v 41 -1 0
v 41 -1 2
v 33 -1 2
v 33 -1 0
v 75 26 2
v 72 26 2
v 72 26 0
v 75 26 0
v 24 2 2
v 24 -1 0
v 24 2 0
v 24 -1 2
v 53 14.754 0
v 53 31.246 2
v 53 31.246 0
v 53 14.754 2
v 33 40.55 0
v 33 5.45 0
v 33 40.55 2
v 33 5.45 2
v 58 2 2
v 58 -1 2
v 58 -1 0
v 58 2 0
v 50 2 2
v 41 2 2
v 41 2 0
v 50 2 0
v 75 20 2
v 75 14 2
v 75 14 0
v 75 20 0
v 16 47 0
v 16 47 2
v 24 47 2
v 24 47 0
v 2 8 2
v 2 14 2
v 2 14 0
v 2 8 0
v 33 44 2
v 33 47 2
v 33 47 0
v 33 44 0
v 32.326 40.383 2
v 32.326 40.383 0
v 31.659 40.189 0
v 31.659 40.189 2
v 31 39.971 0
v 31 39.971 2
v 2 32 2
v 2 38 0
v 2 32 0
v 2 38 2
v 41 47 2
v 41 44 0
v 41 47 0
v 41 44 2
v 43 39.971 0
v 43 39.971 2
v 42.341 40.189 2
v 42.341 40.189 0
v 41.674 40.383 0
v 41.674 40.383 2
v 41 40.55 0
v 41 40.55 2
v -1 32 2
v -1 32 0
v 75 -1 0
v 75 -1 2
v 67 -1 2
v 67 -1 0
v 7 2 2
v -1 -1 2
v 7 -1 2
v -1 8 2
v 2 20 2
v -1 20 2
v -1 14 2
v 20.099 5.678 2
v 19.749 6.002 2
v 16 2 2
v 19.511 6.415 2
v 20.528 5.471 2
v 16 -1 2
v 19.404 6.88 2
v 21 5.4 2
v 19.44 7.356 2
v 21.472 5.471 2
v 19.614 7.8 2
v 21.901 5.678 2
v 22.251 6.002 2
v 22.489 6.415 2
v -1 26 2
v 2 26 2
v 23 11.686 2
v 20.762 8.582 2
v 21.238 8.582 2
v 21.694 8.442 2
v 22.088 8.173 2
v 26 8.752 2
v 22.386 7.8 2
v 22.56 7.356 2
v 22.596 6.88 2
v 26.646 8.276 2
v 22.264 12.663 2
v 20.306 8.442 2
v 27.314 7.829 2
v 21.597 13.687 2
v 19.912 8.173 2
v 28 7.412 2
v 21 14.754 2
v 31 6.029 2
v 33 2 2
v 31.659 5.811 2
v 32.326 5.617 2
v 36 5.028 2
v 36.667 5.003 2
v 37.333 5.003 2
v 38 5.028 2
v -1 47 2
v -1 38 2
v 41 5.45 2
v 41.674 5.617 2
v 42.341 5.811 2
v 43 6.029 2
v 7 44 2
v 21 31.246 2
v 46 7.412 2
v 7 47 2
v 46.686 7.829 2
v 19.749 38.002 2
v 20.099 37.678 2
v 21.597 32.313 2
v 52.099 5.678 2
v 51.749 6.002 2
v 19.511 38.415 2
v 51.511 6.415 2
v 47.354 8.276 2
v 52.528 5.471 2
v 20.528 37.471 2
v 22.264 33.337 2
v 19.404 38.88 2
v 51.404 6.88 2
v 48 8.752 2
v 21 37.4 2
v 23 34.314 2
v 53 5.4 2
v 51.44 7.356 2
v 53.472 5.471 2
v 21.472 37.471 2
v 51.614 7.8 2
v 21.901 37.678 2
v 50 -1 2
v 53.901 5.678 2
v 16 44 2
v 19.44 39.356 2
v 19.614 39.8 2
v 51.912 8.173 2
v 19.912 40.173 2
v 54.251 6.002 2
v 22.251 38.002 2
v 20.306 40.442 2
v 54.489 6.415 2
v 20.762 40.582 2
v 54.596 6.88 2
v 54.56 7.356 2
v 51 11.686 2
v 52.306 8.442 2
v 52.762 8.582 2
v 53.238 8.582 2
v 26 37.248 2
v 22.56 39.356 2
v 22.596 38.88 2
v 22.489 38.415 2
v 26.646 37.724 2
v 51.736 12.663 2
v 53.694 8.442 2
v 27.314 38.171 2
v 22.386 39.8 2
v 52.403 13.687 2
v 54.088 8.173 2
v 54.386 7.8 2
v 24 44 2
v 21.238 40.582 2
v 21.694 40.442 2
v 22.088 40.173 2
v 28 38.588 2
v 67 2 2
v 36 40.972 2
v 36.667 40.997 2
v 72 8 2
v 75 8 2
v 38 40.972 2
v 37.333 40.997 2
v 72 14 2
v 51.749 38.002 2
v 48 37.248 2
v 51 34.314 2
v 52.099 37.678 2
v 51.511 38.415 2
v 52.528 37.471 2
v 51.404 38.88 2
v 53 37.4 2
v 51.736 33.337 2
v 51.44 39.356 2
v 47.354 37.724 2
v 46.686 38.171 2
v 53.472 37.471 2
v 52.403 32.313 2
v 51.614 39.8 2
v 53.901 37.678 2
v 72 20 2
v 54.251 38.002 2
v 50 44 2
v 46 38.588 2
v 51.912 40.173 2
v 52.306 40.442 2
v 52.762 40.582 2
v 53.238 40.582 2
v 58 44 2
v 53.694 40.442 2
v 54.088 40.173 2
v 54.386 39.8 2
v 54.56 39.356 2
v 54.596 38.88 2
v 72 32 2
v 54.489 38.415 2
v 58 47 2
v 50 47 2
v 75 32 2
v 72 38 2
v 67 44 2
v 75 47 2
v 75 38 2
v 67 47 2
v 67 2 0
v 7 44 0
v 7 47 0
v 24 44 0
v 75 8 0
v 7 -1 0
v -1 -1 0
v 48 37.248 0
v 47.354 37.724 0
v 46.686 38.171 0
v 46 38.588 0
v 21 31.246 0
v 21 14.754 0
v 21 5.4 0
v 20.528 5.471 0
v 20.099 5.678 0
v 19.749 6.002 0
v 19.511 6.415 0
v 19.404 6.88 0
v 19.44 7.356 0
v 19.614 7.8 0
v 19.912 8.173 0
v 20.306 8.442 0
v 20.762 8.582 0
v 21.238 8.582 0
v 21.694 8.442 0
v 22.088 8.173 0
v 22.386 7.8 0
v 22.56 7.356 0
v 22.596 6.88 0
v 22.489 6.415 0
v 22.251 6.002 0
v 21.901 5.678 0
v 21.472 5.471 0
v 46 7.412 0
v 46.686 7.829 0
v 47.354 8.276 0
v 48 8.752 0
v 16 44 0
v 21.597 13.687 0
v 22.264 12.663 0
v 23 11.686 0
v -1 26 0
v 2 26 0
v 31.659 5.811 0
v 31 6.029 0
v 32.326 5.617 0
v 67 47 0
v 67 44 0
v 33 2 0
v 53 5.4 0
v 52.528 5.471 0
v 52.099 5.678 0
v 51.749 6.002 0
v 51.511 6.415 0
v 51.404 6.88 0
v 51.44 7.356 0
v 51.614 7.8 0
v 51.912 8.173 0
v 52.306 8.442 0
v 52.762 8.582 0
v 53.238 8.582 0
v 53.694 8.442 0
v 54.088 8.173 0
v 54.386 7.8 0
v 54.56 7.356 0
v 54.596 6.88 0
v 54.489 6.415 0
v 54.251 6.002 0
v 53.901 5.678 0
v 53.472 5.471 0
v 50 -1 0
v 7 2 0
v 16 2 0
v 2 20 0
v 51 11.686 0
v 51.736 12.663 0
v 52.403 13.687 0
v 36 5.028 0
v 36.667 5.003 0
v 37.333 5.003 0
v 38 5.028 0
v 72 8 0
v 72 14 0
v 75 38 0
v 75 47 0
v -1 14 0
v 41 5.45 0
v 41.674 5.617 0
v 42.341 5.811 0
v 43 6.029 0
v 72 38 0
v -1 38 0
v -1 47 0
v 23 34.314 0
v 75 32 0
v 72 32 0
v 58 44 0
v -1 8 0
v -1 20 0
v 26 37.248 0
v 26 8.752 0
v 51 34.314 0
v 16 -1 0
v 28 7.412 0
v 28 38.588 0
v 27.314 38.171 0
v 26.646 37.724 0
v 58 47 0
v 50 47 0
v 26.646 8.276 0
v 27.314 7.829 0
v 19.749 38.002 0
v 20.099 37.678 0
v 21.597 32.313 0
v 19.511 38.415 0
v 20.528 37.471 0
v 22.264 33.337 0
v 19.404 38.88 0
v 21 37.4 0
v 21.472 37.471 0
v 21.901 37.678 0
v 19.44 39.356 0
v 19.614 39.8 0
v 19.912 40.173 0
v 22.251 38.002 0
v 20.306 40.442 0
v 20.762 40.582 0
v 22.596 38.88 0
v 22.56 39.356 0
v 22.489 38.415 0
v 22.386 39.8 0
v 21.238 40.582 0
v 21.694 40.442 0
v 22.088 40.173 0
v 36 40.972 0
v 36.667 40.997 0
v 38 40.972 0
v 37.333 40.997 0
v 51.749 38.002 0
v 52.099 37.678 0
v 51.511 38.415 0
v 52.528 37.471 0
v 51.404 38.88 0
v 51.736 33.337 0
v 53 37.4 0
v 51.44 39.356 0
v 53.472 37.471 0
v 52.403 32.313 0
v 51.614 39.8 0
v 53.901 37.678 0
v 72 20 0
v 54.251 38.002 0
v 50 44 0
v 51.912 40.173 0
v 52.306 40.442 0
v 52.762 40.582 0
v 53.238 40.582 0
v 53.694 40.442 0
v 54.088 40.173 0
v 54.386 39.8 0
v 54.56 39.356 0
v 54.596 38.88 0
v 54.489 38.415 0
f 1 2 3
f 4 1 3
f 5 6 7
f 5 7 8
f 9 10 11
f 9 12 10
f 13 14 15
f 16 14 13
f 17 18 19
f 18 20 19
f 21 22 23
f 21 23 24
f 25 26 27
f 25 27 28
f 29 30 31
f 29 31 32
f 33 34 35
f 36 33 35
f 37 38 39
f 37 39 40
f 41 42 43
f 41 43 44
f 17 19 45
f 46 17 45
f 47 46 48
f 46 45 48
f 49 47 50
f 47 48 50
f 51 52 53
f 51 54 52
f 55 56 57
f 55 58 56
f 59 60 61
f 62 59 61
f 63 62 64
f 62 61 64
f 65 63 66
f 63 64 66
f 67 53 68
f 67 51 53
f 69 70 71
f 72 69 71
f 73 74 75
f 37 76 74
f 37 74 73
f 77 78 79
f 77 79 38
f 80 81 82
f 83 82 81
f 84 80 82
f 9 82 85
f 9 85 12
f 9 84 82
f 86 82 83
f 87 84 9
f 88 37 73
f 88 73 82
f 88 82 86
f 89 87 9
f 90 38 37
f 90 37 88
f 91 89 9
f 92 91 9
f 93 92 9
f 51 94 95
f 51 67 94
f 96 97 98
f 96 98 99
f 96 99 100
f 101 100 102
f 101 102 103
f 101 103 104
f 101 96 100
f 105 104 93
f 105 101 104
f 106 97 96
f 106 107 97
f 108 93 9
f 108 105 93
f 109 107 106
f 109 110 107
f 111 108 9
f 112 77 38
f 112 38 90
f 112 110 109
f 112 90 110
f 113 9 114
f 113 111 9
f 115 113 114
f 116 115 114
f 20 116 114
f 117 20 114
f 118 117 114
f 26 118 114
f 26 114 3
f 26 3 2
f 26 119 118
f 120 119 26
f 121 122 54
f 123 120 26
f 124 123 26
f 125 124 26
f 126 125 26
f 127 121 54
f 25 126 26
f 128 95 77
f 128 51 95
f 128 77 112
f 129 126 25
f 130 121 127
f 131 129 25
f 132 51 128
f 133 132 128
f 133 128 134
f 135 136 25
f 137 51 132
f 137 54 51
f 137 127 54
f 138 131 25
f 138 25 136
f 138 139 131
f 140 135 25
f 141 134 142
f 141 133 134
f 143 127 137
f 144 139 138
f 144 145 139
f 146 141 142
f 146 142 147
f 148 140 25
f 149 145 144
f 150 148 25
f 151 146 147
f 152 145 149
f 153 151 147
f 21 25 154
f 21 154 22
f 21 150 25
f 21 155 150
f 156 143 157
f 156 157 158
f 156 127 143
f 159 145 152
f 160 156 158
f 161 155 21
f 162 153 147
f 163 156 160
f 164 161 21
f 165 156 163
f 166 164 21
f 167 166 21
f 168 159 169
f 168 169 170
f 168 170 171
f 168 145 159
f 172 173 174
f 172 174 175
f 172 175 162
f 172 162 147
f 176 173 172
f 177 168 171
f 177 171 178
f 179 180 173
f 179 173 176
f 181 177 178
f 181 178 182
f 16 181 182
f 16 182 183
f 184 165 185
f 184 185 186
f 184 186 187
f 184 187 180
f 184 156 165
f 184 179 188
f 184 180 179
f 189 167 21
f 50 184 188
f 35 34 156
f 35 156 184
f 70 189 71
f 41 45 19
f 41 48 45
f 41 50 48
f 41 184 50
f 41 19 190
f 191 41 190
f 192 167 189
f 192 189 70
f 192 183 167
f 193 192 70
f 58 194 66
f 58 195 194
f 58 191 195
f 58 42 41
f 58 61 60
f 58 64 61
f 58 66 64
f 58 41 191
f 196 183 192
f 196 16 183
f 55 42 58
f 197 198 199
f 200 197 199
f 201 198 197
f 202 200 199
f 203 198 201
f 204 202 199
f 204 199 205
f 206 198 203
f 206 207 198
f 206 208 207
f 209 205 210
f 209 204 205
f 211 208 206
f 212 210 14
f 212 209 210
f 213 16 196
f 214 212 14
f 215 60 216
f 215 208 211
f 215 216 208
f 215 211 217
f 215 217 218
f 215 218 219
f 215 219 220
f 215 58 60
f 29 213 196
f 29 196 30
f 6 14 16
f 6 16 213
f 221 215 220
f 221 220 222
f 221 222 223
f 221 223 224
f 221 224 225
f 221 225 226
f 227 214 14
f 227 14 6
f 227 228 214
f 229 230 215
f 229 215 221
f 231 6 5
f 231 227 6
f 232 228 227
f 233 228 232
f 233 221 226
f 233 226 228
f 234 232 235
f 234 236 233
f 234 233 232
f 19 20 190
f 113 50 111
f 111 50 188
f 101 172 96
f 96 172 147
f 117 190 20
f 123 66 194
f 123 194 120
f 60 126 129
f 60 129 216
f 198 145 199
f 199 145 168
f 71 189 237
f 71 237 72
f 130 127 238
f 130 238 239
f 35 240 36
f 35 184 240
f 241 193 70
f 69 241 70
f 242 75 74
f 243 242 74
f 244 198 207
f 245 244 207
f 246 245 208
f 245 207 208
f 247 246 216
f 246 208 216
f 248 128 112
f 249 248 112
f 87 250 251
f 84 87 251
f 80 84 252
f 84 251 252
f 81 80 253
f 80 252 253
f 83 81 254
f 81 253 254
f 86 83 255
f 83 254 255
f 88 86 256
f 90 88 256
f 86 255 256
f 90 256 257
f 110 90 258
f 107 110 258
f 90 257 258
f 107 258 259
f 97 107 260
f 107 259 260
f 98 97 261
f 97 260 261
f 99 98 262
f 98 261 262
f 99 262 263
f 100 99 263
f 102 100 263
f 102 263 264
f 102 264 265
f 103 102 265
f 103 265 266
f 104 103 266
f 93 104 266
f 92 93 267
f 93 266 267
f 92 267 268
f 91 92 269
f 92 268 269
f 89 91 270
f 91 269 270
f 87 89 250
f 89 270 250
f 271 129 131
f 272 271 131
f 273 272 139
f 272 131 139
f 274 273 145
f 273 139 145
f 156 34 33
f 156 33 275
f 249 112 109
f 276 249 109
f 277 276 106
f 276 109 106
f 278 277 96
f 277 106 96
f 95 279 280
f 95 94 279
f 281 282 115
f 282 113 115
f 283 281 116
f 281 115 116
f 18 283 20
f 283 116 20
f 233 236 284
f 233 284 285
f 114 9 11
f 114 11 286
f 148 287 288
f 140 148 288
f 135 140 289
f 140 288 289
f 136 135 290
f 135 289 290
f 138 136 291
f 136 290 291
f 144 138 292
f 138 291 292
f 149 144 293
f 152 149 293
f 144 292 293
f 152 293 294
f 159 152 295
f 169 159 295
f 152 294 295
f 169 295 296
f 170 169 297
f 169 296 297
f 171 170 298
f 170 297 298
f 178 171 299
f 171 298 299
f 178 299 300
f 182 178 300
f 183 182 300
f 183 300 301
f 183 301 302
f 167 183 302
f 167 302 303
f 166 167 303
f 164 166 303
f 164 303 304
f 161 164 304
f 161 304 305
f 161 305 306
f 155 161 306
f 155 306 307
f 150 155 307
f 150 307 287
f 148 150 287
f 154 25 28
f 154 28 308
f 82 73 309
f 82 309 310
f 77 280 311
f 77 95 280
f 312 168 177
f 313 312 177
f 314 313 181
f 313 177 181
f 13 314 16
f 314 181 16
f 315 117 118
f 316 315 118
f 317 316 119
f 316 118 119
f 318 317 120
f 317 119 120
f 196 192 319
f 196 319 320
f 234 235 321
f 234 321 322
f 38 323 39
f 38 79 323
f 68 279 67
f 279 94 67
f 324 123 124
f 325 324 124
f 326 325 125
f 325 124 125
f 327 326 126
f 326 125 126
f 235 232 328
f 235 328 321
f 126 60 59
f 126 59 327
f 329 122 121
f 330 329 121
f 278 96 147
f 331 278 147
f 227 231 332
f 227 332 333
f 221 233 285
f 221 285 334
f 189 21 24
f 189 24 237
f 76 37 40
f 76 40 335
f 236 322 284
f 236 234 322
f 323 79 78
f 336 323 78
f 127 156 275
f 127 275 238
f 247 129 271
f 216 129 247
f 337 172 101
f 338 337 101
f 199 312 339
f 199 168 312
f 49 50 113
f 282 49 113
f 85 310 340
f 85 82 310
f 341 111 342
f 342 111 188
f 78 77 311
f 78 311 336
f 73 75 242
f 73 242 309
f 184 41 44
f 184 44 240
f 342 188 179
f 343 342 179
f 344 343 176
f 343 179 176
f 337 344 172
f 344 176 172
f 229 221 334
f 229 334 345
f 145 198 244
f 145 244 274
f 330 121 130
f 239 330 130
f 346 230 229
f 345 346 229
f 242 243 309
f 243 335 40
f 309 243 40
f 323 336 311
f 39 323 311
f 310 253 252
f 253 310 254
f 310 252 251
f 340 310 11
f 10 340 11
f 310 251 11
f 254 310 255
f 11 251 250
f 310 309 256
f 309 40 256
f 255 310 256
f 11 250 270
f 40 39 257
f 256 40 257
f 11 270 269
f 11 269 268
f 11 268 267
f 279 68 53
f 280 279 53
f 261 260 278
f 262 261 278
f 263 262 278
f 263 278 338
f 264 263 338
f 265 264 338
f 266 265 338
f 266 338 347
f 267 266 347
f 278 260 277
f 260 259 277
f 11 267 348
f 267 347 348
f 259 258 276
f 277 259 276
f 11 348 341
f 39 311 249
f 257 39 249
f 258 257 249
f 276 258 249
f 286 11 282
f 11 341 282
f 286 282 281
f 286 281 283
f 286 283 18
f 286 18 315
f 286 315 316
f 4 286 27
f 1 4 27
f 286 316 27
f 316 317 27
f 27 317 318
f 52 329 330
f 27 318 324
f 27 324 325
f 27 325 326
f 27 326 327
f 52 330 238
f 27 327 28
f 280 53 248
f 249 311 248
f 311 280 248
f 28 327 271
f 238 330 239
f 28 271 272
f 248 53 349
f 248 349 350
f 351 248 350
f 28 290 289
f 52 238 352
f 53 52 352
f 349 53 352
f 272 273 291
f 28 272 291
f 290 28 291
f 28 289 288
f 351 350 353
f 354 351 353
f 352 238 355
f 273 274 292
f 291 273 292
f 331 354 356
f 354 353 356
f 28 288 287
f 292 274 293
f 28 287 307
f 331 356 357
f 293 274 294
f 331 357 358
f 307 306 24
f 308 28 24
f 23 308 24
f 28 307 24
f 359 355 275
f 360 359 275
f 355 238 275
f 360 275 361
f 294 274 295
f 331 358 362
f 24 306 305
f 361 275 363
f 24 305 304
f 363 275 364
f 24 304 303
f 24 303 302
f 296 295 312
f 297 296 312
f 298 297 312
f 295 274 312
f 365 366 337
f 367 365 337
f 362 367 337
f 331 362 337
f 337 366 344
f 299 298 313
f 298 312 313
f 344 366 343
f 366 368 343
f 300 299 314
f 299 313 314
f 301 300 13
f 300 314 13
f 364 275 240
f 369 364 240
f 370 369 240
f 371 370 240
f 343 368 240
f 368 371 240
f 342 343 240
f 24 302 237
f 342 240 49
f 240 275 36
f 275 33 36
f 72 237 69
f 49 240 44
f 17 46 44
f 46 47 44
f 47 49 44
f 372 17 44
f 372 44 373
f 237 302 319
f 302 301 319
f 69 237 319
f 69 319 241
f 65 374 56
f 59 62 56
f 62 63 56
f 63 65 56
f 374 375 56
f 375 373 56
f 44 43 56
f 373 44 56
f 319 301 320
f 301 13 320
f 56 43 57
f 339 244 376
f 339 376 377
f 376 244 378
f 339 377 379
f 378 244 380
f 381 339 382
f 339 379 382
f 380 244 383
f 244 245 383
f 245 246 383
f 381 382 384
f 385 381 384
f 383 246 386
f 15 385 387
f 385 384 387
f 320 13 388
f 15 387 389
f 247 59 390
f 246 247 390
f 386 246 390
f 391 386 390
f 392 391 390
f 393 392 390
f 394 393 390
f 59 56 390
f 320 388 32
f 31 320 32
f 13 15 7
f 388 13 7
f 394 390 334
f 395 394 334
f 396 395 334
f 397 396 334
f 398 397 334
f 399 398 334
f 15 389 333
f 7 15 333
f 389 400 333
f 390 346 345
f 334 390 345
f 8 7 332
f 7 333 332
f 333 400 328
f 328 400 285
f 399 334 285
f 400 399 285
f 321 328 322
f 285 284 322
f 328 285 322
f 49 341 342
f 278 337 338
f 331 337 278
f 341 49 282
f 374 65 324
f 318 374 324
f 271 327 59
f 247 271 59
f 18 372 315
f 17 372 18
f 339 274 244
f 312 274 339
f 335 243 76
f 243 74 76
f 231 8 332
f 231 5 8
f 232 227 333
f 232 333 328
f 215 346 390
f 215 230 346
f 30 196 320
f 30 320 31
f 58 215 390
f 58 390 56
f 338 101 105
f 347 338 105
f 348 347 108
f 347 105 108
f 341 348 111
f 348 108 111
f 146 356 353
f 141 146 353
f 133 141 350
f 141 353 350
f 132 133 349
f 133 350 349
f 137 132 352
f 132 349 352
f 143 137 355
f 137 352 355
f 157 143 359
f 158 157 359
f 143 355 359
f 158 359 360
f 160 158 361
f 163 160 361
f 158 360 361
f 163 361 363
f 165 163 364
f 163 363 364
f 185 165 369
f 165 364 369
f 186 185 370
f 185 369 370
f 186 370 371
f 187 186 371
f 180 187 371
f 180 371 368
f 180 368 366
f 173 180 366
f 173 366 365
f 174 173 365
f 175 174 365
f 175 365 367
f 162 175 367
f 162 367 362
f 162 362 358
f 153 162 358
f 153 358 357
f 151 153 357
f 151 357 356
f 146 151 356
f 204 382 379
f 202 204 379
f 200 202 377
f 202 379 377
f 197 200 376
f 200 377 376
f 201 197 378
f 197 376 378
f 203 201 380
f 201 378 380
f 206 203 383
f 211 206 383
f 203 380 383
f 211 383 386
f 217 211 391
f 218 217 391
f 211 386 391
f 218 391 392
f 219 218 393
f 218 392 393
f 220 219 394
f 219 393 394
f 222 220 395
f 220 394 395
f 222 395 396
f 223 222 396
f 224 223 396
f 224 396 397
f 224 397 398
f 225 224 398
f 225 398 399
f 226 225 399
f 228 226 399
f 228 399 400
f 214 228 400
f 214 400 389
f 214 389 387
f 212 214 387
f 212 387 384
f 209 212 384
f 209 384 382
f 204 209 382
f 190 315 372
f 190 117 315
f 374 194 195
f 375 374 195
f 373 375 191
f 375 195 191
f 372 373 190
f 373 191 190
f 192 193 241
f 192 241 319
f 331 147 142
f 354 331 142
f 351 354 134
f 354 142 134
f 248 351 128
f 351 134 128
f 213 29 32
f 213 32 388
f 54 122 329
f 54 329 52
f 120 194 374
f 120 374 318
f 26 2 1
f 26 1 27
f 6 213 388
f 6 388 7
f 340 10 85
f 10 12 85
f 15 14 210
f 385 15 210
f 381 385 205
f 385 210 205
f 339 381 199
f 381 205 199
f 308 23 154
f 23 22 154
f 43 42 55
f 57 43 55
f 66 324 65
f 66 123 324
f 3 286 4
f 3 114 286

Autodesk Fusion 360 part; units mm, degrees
sketch "スケッチ1" plane through (0, 0, 0) normal (0, 0, 1) x (1, 0, 0)
  line L0 (0, 0) -> (74, 0)
  line L1 (74, 0) -> (74, 46)
  line L2 (74, 46) -> (0, 46)
  line L3 (0, 46) -> (0, 0)
  dimension "d1" = 46
  dimension "d2" = 74
extrude "押し出し1" add sketch "スケッチ1" along normal blind 2
sketch "スケッチ2" plane through (0, 0, 2) normal (0, 0, 1) x (-1, 0, 0)
  line L0 (0, -46) -> (0, 0)
  line L1 (0, 0) -> (-74, 0)
  line L2 (-74, 0) -> (-74, -46)
  line L3 (-74, -46) -> (0, -46)
  circle A0 centre (-53, -39) radius 1.6
  circle A1 centre (-53, -39) radius 1.6
  circle A2 centre (-53, -7) radius 1.6
  circle A3 centre (-21, -7) radius 1.6
  circle A4 centre (-21, -39) radius 1.6
  dimension "d5" = 3.2
  dimension "d6" = 7
  dimension "d7" = 21
  dimension "d8" = 3.2
  dimension "d9" = 3.2
  dimension "d10" = 3.2
  dimension "d11" = 3.2
  dimension "d12" = 7
  dimension "d13" = 21
hole "穴1" at (21, 39, 2) at (53, 39, 2) at (53, 7, 2) at (21, 7, 2) direction (0, 0, -1) diameter 3.2 depth 16 tip angle 118
sketch "スケッチ3" plane through (0, 0, 2) normal (0, 0, 1) x (-1, 0, 0)
  circle A0 centre (-53, -7) radius 1.6
  circle A1 centre (-21, -39) radius 1.6
  circle A2 centre (-53, -39) radius 1.6
  circle A3 centre (-21, -7) radius 1.6
  line L0 (0, -46) -> (0, 0)
  line L1 (0, 0) -> (-74, 0)
  line L2 (-74, 0) -> (-74, -46)
  line L3 (-74, -46) -> (0, -46)
  line L4 (-58, -46) -> (-67, -46)
  line L5 (-67, -46) -> (-67, -44)
  line L6 (-67, -44) -> (-58, -44)
  line L7 (-58, -44) -> (-58, -46)
  line L8 (-50, -46) -> (-50, -44)
  line L9 (-41, -46) -> (-50, -46)
  line L10 (-50, -44) -> (-41, -44)
  line L11 (-41, -44) -> (-41, -46)
  line L12 (-33, -46) -> (-33, -44)
  line L13 (-24, -46) -> (-33, -46)
  line L14 (-33, -44) -> (-24, -44)
  line L15 (-24, -44) -> (-24, -46)
  line L16 (-16, -46) -> (-16, -44)
  line L17 (-7, -46) -> (-16, -46)
  line L18 (-16, -44) -> (-7, -44)
  line L19 (-7, -44) -> (-7, -46)
  line L20 (0, -38) -> (-2, -38)
  line L21 (-2, -38) -> (-2, -32)
  line L22 (-2, -32) -> (0, -32)
  line L23 (0, -32) -> (0, -38)
  line L24 (-2, -20) -> (0, -20)
  line L25 (0, -20) -> (0, -26)
  line L26 (-2, -26) -> (-2, -20)
  line L27 (0, -26) -> (-2, -26)
  line L28 (-2, -8) -> (0, -8)
  line L29 (0, -8) -> (0, -14)
  line L30 (-2, -14) -> (-2, -8)
  line L31 (0, -14) -> (-2, -14)
  line L32 (-72, -8) -> (-72, -14)
  line L33 (-72, -38) -> (-74, -38)
  line L34 (-72, -32) -> (-72, -38)
  line L35 (-74, -26) -> (-74, -20)
  line L36 (-74, -32) -> (-72, -32)
  line L37 (-74, -20) -> (-72, -20)
  line L38 (-72, -20) -> (-72, -26)
  line L39 (-74, -14) -> (-74, -8)
  line L40 (-72, -26) -> (-74, -26)
  line L41 (-74, -38) -> (-74, -32)
  line L42 (-74, -8) -> (-72, -8)
  line L43 (-72, -14) -> (-74, -14)
  line L44 (-144, -8) -> (-144, -14)
  line L45 (-144, -38) -> (-146, -38)
  line L46 (-144, -32) -> (-144, -38)
  line L47 (-146, -26) -> (-146, -20)
  line L48 (-146, -32) -> (-144, -32)
  line L49 (-146, -20) -> (-144, -20)
  line L50 (-144, -20) -> (-144, -26)
  line L51 (-146, -14) -> (-146, -8)
  line L52 (-144, -26) -> (-146, -26)
  line L53 (-146, -38) -> (-146, -32)
  line L54 (-146, -8) -> (-144, -8)
  line L55 (-144, -14) -> (-146, -14)
  line L56 (-41, 0) -> (-41, -2)
  line L57 (-67, 0) -> (-58, 0)
  line L58 (-67, -2) -> (-67, 0)
  line L59 (-41, -2) -> (-50, -2)
  line L60 (-7, 0) -> (-7, -2)
  line L61 (-24, 0) -> (-24, -2)
  line L62 (-33, 0) -> (-24, 0)
  line L63 (-50, -2) -> (-50, 0)
  line L64 (-24, -2) -> (-33, -2)
  line L65 (-7, -2) -> (-16, -2)
  line L66 (-58, -2) -> (-67, -2)
  line L67 (-16, -2) -> (-16, 0)
  line L68 (-50, 0) -> (-41, 0)
  line L69 (-58, 0) -> (-58, -2)
  line L70 (-16, 0) -> (-7, 0)
  line L71 (-33, -2) -> (-33, 0)
  line L72 (-41, 44) -> (-41, 42)
  line L73 (-67, 44) -> (-58, 44)
  line L74 (-67, 42) -> (-67, 44)
  line L75 (-41, 42) -> (-50, 42)
  line L76 (-7, 44) -> (-7, 42)
  line L77 (-24, 44) -> (-24, 42)
  line L78 (-33, 44) -> (-24, 44)
  line L79 (-50, 42) -> (-50, 44)
  line L80 (-24, 42) -> (-33, 42)
  line L81 (-7, 42) -> (-16, 42)
  line L82 (-58, 42) -> (-67, 42)
  line L83 (-16, 42) -> (-16, 44)
  line L84 (-50, 44) -> (-41, 44)
  line L85 (-58, 44) -> (-58, 42)
  line L86 (-16, 44) -> (-7, 44)
  line L87 (-33, 42) -> (-33, 44)
  dimension "d17" = 9
  dimension "d18" = 2
  dimension "d19" = 7
  dimension "d22" = 17
  dimension "d23" = 0
  dimension "d24" = 6
  dimension "d25" = 2
  dimension "d26" = 8
  dimension "d29" = 0
  dimension "d30" = 12
  dimension "d33" = -72
  dimension "d34" = 0
  dimension "d37" = 0
  dimension "d38" = 44
extrude "押し出し2" cut sketch "スケッチ3" against normal blind 2 contours L0 L20 L21 L22 L23 | L3 L16 L17 L18 L19 | L0 L24 L25 L26 L27 | L3 L12 L13 L14 L15 | L0 L28 L29 L30 L31 | L3 L8 L9 L10 L11 | L3 L4 L5 L6 L7 | L1 L60 L65 L67 L70 | L1 L61 L62 L64 L71 | L2 L33 L34 L36 L41 | L1 L56 L59 L63 L68 | L2 L35 L37 L38 L40 | L1 L57 L58 L66 L69 | L2 L32 L39 L42 L43
sketch "スケッチ4" plane through (0, 0, 2) normal (0, 0, 1) x (-1, 0, 0)
  line L0 (-50, -2) -> (-50, 0)
  line L1 (-50, 0) -> (-58, 0)
  line L2 (-58, 0) -> (-58, -2)
  line L3 (-58, -2) -> (-67, -2)
  line L4 (-67, -2) -> (-67, 0)
  line L5 (-67, 0) -> (-74, 0)
  line L6 (-74, 0) -> (-74, -8)
  line L7 (-74, -8) -> (-72, -8)
  line L8 (-72, -8) -> (-72, -14)
  line L9 (-72, -14) -> (-74, -14)
  line L10 (-74, -14) -> (-74, -20)
  line L11 (-74, -20) -> (-72, -20)
  line L12 (-72, -20) -> (-72, -26)
  line L13 (-72, -26) -> (-74, -26)
  line L14 (-74, -26) -> (-74, -32)
  line L15 (-74, -32) -> (-72, -32)
  line L16 (-72, -32) -> (-72, -38)
  line L17 (-72, -38) -> (-74, -38)
  line L18 (-74, -38) -> (-74, -46)
  line L19 (-74, -46) -> (-67, -46)
  line L20 (-67, -46) -> (-67, -44)
  line L21 (-67, -44) -> (-58, -44)
  line L22 (-58, -44) -> (-58, -46)
  line L23 (-58, -46) -> (-50, -46)
  line L24 (-50, -46) -> (-50, -44)
  line L25 (-50, -44) -> (-41, -44)
  line L26 (-41, -44) -> (-41, -46)
  line L27 (-41, -46) -> (-33, -46)
  line L28 (-33, -46) -> (-33, -44)
  line L29 (-33, -44) -> (-24, -44)
  line L30 (-24, -44) -> (-24, -46)
  line L31 (-24, -46) -> (-16, -46)
  line L32 (-16, -46) -> (-16, -44)
  line L33 (-16, -44) -> (-7, -44)
  line L34 (-7, -44) -> (-7, -46)
  line L35 (-7, -46) -> (0, -46)
  line L36 (0, -46) -> (0, -38)
  line L37 (0, -38) -> (-2, -38)
  line L38 (-2, -38) -> (-2, -32)
  line L39 (-2, -32) -> (0, -32)
  line L40 (0, -32) -> (0, -26)
  line L41 (0, -26) -> (-2, -26)
  line L42 (-2, -26) -> (-2, -20)
  line L43 (-2, -20) -> (0, -20)
  line L44 (0, -20) -> (0, -14)
  line L45 (0, -14) -> (-2, -14)
  line L46 (-2, -14) -> (-2, -8)
  line L47 (-2, -8) -> (0, -8)
  line L48 (0, -8) -> (0, 0)
  line L49 (0, 0) -> (-7, 0)
  line L50 (-7, 0) -> (-7, -2)
  line L51 (-7, -2) -> (-16, -2)
  line L52 (-16, -2) -> (-16, 0)
  line L53 (-16, 0) -> (-24, 0)
  line L54 (-24, 0) -> (-24, -2)
  line L55 (-24, -2) -> (-33, -2)
  line L56 (-33, -2) -> (-33, 0)
  line L57 (-33, 0) -> (-41, 0)
  line L58 (-41, 0) -> (-41, -2)
  line L59 (-41, -2) -> (-50, -2)
  circle A0 centre (-53, -7) radius 1.6
  circle A1 centre (-21, -39) radius 1.6
  circle A2 centre (-53, -39) radius 1.6
  circle A3 centre (-21, -7) radius 1.6
  circle A4 centre (-37, -23) radius 18
  line L60 (-36, -42) -> (-38, -42)
  line L61 (-38, -42) -> (-38, -4)
  line L62 (-38, -4) -> (-36, -4)
  line L63 (-36, -4) -> (-36, -42)
  line L64 (-41, -42) -> (-43, -42)
  line L65 (-43, -42) -> (-43, -5)
  line L66 (-43, -5) -> (-41, -5)
  line L67 (-41, -5) -> (-41, -42)
  line L68 (-46, -40) -> (-48, -40)
  line L69 (-48, -40) -> (-48, -6)
  line L70 (-48, -6) -> (-46, -6)
  line L71 (-46, -6) -> (-46, -40)
  line L72 (-51, -36) -> (-53, -36)
  line L73 (-53, -36) -> (-53, -11)
  line L74 (-53, -11) -> (-51, -11)
  line L75 (-51, -11) -> (-51, -36)
  line L76 (-33, -42) -> (-31, -42)
  line L77 (-31, -42) -> (-31, -4)
  line L78 (-31, -4) -> (-33, -4)
  line L79 (-33, -4) -> (-33, -42)
  line L80 (-28, -40) -> (-26, -40)
  line L81 (-26, -40) -> (-26, -6)
  line L82 (-26, -6) -> (-28, -6)
  line L83 (-28, -6) -> (-28, -40)
  line L84 (-23, -36) -> (-21, -36)
  line L85 (-21, -36) -> (-21, -11)
  line L86 (-21, -11) -> (-23, -11)
  line L87 (-23, -11) -> (-23, -36)
extrude "押し出し3" cut sketch "スケッチ4" against normal blind 2 contours A4 L85 L87 | A4 L81 L83 | A4 L77 L79 | A4 L61 L63 | A4 L65 L67 | A4 L69 L71 | A4 L73 L75
sketch "スケッチ5" plane through (0, 0, 2) normal (0, 0, 1) x (-1, 0, 0)
  line L0 (-33, -40.5499) -> (-33, -5.4501)
  arc A0 (-31, -6.0294) -> (-33, -5.4501) centre (-37, -23) ccw
  line L1 (-31, -6.0294) -> (-31, -39.9706)
  arc A1 (-33, -40.5499) -> (-31, -39.9706) centre (-37, -23) ccw
  line L2 (-51, -11.6863) -> (-51, -34.3137)
  arc A2 (-53, -31.2462) -> (-51, -34.3137) centre (-37, -23) ccw
  line L3 (-53, -31.2462) -> (-53, -14.7538)
  arc A3 (-51, -11.6863) -> (-53, -14.7538) centre (-37, -23) ccw
  line L4 (-36, -5.0278) -> (-36, -40.9722)
  arc A4 (-38, -40.9722) -> (-36, -40.9722) centre (-37, -23) ccw
  line L5 (-38, -40.9722) -> (-38, -5.0278)
  arc A5 (-36, -5.0278) -> (-38, -5.0278) centre (-37, -23) ccw
  line L6 (-28, -38.5885) -> (-28, -7.4115)
  arc A6 (-26, -8.7522) -> (-28, -7.4115) centre (-37, -23) ccw
  line L7 (-26, -8.7522) -> (-26, -37.2478)
  arc A7 (-28, -38.5885) -> (-26, -37.2478) centre (-37, -23) ccw
  line L8 (-46, -7.4115) -> (-46, -38.5885)
  arc A8 (-48, -37.2478) -> (-46, -38.5885) centre (-37, -23) ccw
  line L9 (-48, -37.2478) -> (-48, -8.7522)
  arc A9 (-46, -7.4115) -> (-48, -8.7522) centre (-37, -23) ccw
  line L10 (-41, -5.4501) -> (-41, -40.5499)
  arc A10 (-43, -39.9706) -> (-41, -40.5499) centre (-37, -23) ccw
  line L11 (-43, -39.9706) -> (-43, -6.0294)
  arc A11 (-41, -5.4501) -> (-43, -6.0294) centre (-37, -23) ccw
  line L12 (-23, -34.3137) -> (-23, -11.6863)
  arc A12 (-21, -14.7538) -> (-23, -11.6863) centre (-37, -23) ccw
  line L13 (-21, -14.7538) -> (-21, -31.2462)
  arc A13 (-23, -34.3137) -> (-21, -31.2462) centre (-37, -23) ccw
  line L14 (-50, -2) -> (-50, 0)
  line L15 (-50, 0) -> (-58, 0)
  line L16 (-58, 0) -> (-58, -2)
  line L17 (-58, -2) -> (-67, -2)
  line L18 (-67, -2) -> (-67, 0)
  line L19 (-67, 0) -> (-74, 0)
  line L20 (-74, 0) -> (-74, -8)
  line L21 (-74, -8) -> (-72, -8)
  line L22 (-72, -8) -> (-72, -14)
  line L23 (-72, -14) -> (-74, -14)
  line L24 (-74, -14) -> (-74, -20)
  line L25 (-74, -20) -> (-72, -20)
  line L26 (-72, -20) -> (-72, -26)
  line L27 (-72, -26) -> (-74, -26)
  line L28 (-74, -26) -> (-74, -32)
  line L29 (-74, -32) -> (-72, -32)
  line L30 (-72, -32) -> (-72, -38)
  line L31 (-72, -38) -> (-74, -38)
  line L32 (-74, -38) -> (-74, -46)
  line L33 (-74, -46) -> (-67, -46)
  line L34 (-67, -46) -> (-67, -44)
  line L35 (-67, -44) -> (-58, -44)
  line L36 (-58, -44) -> (-58, -46)
  line L37 (-58, -46) -> (-50, -46)
  line L38 (-50, -46) -> (-50, -44)
  line L39 (-50, -44) -> (-41, -44)
  line L40 (-41, -44) -> (-41, -46)
  line L41 (-41, -46) -> (-33, -46)
  line L42 (-33, -46) -> (-33, -44)
  line L43 (-33, -44) -> (-24, -44)
  line L44 (-24, -44) -> (-24, -46)
  line L45 (-24, -46) -> (-16, -46)
  line L46 (-16, -46) -> (-16, -44)
  line L47 (-16, -44) -> (-7, -44)
  line L48 (-7, -44) -> (-7, -46)
  line L49 (-7, -46) -> (0, -46)
  line L50 (0, -46) -> (0, -38)
  line L51 (0, -38) -> (-2, -38)
  line L52 (-2, -38) -> (-2, -32)
  line L53 (-2, -32) -> (0, -32)
  line L54 (0, -32) -> (0, -26)
  line L55 (0, -26) -> (-2, -26)
  line L56 (-2, -26) -> (-2, -20)
  line L57 (-2, -20) -> (0, -20)
  line L58 (0, -20) -> (0, -14)
  line L59 (0, -14) -> (-2, -14)
  line L60 (-2, -14) -> (-2, -8)
  line L61 (-2, -8) -> (0, -8)
  line L62 (0, -8) -> (0, 0)
  line L63 (0, 0) -> (-7, 0)
  line L64 (-7, 0) -> (-7, -2)
  line L65 (-7, -2) -> (-16, -2)
  line L66 (-16, -2) -> (-16, 0)
  line L67 (-16, 0) -> (-24, 0)
  line L68 (-24, 0) -> (-24, -2)
  line L69 (-24, -2) -> (-33, -2)
  line L70 (-33, -2) -> (-33, 0)
  line L71 (-33, 0) -> (-41, 0)
  line L72 (-41, 0) -> (-41, -2)
  line L73 (-41, -2) -> (-50, -2)
  circle A14 centre (-53, -7) radius 1.6
  circle A15 centre (-21, -39) radius 1.6
  circle A16 centre (-53, -39) radius 1.6
  circle A17 centre (-21, -7) radius 1.6
  line L74 (0, 0) -> (-7, 0)
  line L75 (-7, 0) -> (-7, 1)
  line L76 (-7, 1) -> (0, 1)
  line L77 (0, 1) -> (0, 0)
  line L78 (-16, 0) -> (-24, 0)
  line L79 (-24, 0) -> (-24, 1)
  line L80 (-24, 1) -> (-16, 1)
  line L81 (-16, 1) -> (-16, 0)
  line L82 (-33, 0) -> (-41, 0)
  line L83 (-41, 0) -> (-41, 1)
  line L84 (-41, 1) -> (-33, 1)
  line L85 (-33, 1) -> (-33, 0)
  line L86 (-50, 0) -> (-58, 0)
  line L87 (-58, 0) -> (-58, 1)
  line L88 (-58, 1) -> (-50, 1)
  line L89 (-50, 1) -> (-50, 0)
  line L90 (-67, 0) -> (-75, 0)
  line L91 (-75, 0) -> (-75, 1)
  line L92 (-75, 1) -> (-67, 1)
  line L93 (-67, 1) -> (-67, 0)
  line L94 (-74, 0) -> (-75, 0)
  line L95 (-75, 0) -> (-75, -8)
  line L96 (-75, -8) -> (-74, -8)
  line L97 (-74, -8) -> (-74, 0)
  line L98 (-74, -14) -> (-75, -14)
  line L99 (-75, -14) -> (-75, -20)
  line L100 (-75, -20) -> (-74, -20)
  line L101 (-74, -20) -> (-74, -14)
  line L102 (-74, -26) -> (-75, -26)
  line L103 (-75, -26) -> (-75, -32)
  line L104 (-75, -32) -> (-74, -32)
  line L105 (-74, -32) -> (-74, -26)
  line L106 (-74, -38) -> (-75, -38)
  line L107 (-75, -38) -> (-75, -46)
  line L108 (-75, -46) -> (-74, -46)
  line L109 (-74, -46) -> (-74, -38)
  line L110 (-67, -46) -> (-75, -46)
  line L111 (-75, -46) -> (-75, -47)
  line L112 (-75, -47) -> (-67, -47)
  line L113 (-67, -47) -> (-67, -46)
  line L114 (-58, -46) -> (-50, -46)
  line L115 (-50, -46) -> (-50, -47)
  line L116 (-50, -47) -> (-58, -47)
  line L117 (-58, -47) -> (-58, -46)
  line L118 (-41, -46) -> (-33, -46)
  line L119 (-33, -46) -> (-33, -47)
  line L120 (-33, -47) -> (-41, -47)
  line L121 (-41, -47) -> (-41, -46)
  line L122 (-24, -46) -> (-16, -46)
  line L123 (-16, -46) -> (-16, -47)
  line L124 (-16, -47) -> (-24, -47)
  line L125 (-24, -47) -> (-24, -46)
  line L126 (-7, -46) -> (0, -46)
  line L127 (0, -46) -> (0, -47)
  line L128 (0, -47) -> (-7, -47)
  line L129 (-7, -47) -> (-7, -46)
  line L130 (1, -47) -> (0, -47)
  line L131 (0, -47) -> (0, -38)
  line L132 (0, -38) -> (1, -38)
  line L133 (1, -38) -> (1, -47)
  line L134 (1, -32) -> (0, -32)
  line L135 (0, -32) -> (0, -26)
  line L136 (0, -26) -> (1, -26)
  line L137 (1, -26) -> (1, -32)
  line L138 (1, -20) -> (0, -20)
  line L139 (0, -20) -> (0, -14)
  line L140 (0, -14) -> (1, -14)
  line L141 (1, -14) -> (1, -20)
  line L142 (1, -8) -> (0, -8)
  line L143 (0, -8) -> (0, 1)
  line L144 (0, 1) -> (1, 1)
  line L145 (1, 1) -> (1, -8)
extrude "押し出し4" add sketch "スケッチ5" against normal blind 2 contours L15 L86 L87 L88 L89 | L71 L82 L83 L84 L85 | L19 L90 L91 L92 L93 L94 | L20 L90 L94 L95 L96 L97 | L67 L78 L79 L80 L81 | L24 L98 L99 L100 L101 | L63 L74 L75 L76 L77 L143 | L62 L77 L142 L143 L144 L145 | L28 L102 L103 L104 L105 | L58 L138 L139 L140 L141 | L32 L106 L107 L108 L109 L110 | L33 L108 L110 L111 L112 L113 | L54 L134 L135 L136 L137 | L37 L114 L115 L116 L117 | L50 L127 L130 L131 L132 L133 | L49 L126 L127 L128 L129 L131 | L41 L118 L119 L120 L121 | L45 L122 L123 L124 L125
sketch "スケッチ6" plane through (0, 0, 0) normal (0, 0, -1) x (1, 0, 0)
  line L0 (33, -5.4501) -> (33, -40.5499)
  arc A0 (31, -39.9706) -> (33, -40.5499) centre (37, -23) ccw
  line L1 (31, -39.9706) -> (31, -6.0294)
  arc A1 (33, -5.4501) -> (31, -6.0294) centre (37, -23) ccw
  line L2 (51, -34.3137) -> (51, -11.6863)
  arc A2 (53, -14.7538) -> (51, -11.6863) centre (37, -23) ccw
  line L3 (53, -14.7538) -> (53, -31.2462)
  arc A3 (51, -34.3137) -> (53, -31.2462) centre (37, -23) ccw
  line L4 (36, -40.9722) -> (36, -5.0278)
  arc A4 (38, -5.0278) -> (36, -5.0278) centre (37, -23) ccw
  line L5 (38, -5.0278) -> (38, -40.9722)
  arc A5 (36, -40.9722) -> (38, -40.9722) centre (37, -23) ccw
  line L6 (28, -7.4115) -> (28, -38.5885)
  arc A6 (26, -37.2478) -> (28, -38.5885) centre (37, -23) ccw
  line L7 (26, -37.2478) -> (26, -8.7522)
  arc A7 (28, -7.4115) -> (26, -8.7522) centre (37, -23) ccw
  line L8 (46, -38.5885) -> (46, -7.4115)
  arc A8 (48, -8.7522) -> (46, -7.4115) centre (37, -23) ccw
  line L9 (48, -8.7522) -> (48, -37.2478)
  arc A9 (46, -38.5885) -> (48, -37.2478) centre (37, -23) ccw
  line L10 (41, -40.5499) -> (41, -5.4501)
  arc A10 (43, -6.0294) -> (41, -5.4501) centre (37, -23) ccw
  line L11 (43, -6.0294) -> (43, -39.9706)
  arc A11 (41, -40.5499) -> (43, -39.9706) centre (37, -23) ccw
  line L12 (23, -11.6863) -> (23, -34.3137)
  arc A12 (21, -31.2462) -> (23, -34.3137) centre (37, -23) ccw
  line L13 (21, -31.2462) -> (21, -14.7538)
  arc A13 (23, -11.6863) -> (21, -14.7538) centre (37, -23) ccw
  line L14 (50, 1) -> (50, -2)
  line L15 (50, -2) -> (41, -2)
  line L16 (41, -2) -> (41, 1)
  line L17 (41, 1) -> (33, 1)
  line L18 (33, 1) -> (33, -2)
  line L19 (33, -2) -> (24, -2)
  line L20 (24, -2) -> (24, 1)
  line L21 (24, 1) -> (16, 1)
  line L22 (16, 1) -> (16, -2)
  line L23 (16, -2) -> (7, -2)
  line L24 (7, -2) -> (7, 1)
  line L25 (7, 1) -> (-1, 1)
  line L26 (-1, 1) -> (-1, -8)
  line L27 (-1, -8) -> (2, -8)
  line L28 (2, -8) -> (2, -14)
  line L29 (2, -14) -> (-1, -14)
  line L30 (-1, -14) -> (-1, -20)
  line L31 (-1, -20) -> (2, -20)
  line L32 (2, -20) -> (2, -26)
  line L33 (2, -26) -> (-1, -26)
  line L34 (-1, -26) -> (-1, -32)
  line L35 (-1, -32) -> (2, -32)
  line L36 (2, -32) -> (2, -38)
  line L37 (2, -38) -> (-1, -38)
  line L38 (-1, -38) -> (-1, -47)
  line L39 (-1, -47) -> (7, -47)
  line L40 (7, -47) -> (7, -44)
  line L41 (7, -44) -> (16, -44)
  line L42 (16, -44) -> (16, -47)
  line L43 (16, -47) -> (24, -47)
  line L44 (24, -47) -> (24, -44)
  line L45 (24, -44) -> (33, -44)
  line L46 (33, -44) -> (33, -47)
  line L47 (33, -47) -> (41, -47)
  line L48 (41, -47) -> (41, -44)
  line L49 (41, -44) -> (50, -44)
  line L50 (50, -44) -> (50, -47)
  line L51 (50, -47) -> (58, -47)
  line L52 (58, -47) -> (58, -44)
  line L53 (58, -44) -> (67, -44)
  line L54 (67, -44) -> (67, -47)
  line L55 (67, -47) -> (75, -47)
  line L56 (75, -47) -> (75, -38)
  line L57 (75, -38) -> (72, -38)
  line L58 (72, -38) -> (72, -32)
  line L59 (72, -32) -> (75, -32)
  line L60 (75, -32) -> (75, -26)
  line L61 (75, -26) -> (72, -26)
  line L62 (72, -26) -> (72, -20)
  line L63 (72, -20) -> (75, -20)
  line L64 (75, -20) -> (75, -14)
  line L65 (75, -14) -> (72, -14)
  line L66 (72, -14) -> (72, -8)
  line L67 (72, -8) -> (75, -8)
  line L68 (75, -8) -> (75, 1)
  line L69 (75, 1) -> (67, 1)
  line L70 (67, 1) -> (67, -2)
  line L71 (67, -2) -> (58, -2)
  line L72 (58, -2) -> (58, 1)
  line L73 (58, 1) -> (50, 1)
  circle A14 centre (21, -7) radius 1.6
  circle A15 centre (53, -39) radius 1.6
  circle A16 centre (21, -39) radius 1.6
  circle A17 centre (53, -7) radius 1.6
